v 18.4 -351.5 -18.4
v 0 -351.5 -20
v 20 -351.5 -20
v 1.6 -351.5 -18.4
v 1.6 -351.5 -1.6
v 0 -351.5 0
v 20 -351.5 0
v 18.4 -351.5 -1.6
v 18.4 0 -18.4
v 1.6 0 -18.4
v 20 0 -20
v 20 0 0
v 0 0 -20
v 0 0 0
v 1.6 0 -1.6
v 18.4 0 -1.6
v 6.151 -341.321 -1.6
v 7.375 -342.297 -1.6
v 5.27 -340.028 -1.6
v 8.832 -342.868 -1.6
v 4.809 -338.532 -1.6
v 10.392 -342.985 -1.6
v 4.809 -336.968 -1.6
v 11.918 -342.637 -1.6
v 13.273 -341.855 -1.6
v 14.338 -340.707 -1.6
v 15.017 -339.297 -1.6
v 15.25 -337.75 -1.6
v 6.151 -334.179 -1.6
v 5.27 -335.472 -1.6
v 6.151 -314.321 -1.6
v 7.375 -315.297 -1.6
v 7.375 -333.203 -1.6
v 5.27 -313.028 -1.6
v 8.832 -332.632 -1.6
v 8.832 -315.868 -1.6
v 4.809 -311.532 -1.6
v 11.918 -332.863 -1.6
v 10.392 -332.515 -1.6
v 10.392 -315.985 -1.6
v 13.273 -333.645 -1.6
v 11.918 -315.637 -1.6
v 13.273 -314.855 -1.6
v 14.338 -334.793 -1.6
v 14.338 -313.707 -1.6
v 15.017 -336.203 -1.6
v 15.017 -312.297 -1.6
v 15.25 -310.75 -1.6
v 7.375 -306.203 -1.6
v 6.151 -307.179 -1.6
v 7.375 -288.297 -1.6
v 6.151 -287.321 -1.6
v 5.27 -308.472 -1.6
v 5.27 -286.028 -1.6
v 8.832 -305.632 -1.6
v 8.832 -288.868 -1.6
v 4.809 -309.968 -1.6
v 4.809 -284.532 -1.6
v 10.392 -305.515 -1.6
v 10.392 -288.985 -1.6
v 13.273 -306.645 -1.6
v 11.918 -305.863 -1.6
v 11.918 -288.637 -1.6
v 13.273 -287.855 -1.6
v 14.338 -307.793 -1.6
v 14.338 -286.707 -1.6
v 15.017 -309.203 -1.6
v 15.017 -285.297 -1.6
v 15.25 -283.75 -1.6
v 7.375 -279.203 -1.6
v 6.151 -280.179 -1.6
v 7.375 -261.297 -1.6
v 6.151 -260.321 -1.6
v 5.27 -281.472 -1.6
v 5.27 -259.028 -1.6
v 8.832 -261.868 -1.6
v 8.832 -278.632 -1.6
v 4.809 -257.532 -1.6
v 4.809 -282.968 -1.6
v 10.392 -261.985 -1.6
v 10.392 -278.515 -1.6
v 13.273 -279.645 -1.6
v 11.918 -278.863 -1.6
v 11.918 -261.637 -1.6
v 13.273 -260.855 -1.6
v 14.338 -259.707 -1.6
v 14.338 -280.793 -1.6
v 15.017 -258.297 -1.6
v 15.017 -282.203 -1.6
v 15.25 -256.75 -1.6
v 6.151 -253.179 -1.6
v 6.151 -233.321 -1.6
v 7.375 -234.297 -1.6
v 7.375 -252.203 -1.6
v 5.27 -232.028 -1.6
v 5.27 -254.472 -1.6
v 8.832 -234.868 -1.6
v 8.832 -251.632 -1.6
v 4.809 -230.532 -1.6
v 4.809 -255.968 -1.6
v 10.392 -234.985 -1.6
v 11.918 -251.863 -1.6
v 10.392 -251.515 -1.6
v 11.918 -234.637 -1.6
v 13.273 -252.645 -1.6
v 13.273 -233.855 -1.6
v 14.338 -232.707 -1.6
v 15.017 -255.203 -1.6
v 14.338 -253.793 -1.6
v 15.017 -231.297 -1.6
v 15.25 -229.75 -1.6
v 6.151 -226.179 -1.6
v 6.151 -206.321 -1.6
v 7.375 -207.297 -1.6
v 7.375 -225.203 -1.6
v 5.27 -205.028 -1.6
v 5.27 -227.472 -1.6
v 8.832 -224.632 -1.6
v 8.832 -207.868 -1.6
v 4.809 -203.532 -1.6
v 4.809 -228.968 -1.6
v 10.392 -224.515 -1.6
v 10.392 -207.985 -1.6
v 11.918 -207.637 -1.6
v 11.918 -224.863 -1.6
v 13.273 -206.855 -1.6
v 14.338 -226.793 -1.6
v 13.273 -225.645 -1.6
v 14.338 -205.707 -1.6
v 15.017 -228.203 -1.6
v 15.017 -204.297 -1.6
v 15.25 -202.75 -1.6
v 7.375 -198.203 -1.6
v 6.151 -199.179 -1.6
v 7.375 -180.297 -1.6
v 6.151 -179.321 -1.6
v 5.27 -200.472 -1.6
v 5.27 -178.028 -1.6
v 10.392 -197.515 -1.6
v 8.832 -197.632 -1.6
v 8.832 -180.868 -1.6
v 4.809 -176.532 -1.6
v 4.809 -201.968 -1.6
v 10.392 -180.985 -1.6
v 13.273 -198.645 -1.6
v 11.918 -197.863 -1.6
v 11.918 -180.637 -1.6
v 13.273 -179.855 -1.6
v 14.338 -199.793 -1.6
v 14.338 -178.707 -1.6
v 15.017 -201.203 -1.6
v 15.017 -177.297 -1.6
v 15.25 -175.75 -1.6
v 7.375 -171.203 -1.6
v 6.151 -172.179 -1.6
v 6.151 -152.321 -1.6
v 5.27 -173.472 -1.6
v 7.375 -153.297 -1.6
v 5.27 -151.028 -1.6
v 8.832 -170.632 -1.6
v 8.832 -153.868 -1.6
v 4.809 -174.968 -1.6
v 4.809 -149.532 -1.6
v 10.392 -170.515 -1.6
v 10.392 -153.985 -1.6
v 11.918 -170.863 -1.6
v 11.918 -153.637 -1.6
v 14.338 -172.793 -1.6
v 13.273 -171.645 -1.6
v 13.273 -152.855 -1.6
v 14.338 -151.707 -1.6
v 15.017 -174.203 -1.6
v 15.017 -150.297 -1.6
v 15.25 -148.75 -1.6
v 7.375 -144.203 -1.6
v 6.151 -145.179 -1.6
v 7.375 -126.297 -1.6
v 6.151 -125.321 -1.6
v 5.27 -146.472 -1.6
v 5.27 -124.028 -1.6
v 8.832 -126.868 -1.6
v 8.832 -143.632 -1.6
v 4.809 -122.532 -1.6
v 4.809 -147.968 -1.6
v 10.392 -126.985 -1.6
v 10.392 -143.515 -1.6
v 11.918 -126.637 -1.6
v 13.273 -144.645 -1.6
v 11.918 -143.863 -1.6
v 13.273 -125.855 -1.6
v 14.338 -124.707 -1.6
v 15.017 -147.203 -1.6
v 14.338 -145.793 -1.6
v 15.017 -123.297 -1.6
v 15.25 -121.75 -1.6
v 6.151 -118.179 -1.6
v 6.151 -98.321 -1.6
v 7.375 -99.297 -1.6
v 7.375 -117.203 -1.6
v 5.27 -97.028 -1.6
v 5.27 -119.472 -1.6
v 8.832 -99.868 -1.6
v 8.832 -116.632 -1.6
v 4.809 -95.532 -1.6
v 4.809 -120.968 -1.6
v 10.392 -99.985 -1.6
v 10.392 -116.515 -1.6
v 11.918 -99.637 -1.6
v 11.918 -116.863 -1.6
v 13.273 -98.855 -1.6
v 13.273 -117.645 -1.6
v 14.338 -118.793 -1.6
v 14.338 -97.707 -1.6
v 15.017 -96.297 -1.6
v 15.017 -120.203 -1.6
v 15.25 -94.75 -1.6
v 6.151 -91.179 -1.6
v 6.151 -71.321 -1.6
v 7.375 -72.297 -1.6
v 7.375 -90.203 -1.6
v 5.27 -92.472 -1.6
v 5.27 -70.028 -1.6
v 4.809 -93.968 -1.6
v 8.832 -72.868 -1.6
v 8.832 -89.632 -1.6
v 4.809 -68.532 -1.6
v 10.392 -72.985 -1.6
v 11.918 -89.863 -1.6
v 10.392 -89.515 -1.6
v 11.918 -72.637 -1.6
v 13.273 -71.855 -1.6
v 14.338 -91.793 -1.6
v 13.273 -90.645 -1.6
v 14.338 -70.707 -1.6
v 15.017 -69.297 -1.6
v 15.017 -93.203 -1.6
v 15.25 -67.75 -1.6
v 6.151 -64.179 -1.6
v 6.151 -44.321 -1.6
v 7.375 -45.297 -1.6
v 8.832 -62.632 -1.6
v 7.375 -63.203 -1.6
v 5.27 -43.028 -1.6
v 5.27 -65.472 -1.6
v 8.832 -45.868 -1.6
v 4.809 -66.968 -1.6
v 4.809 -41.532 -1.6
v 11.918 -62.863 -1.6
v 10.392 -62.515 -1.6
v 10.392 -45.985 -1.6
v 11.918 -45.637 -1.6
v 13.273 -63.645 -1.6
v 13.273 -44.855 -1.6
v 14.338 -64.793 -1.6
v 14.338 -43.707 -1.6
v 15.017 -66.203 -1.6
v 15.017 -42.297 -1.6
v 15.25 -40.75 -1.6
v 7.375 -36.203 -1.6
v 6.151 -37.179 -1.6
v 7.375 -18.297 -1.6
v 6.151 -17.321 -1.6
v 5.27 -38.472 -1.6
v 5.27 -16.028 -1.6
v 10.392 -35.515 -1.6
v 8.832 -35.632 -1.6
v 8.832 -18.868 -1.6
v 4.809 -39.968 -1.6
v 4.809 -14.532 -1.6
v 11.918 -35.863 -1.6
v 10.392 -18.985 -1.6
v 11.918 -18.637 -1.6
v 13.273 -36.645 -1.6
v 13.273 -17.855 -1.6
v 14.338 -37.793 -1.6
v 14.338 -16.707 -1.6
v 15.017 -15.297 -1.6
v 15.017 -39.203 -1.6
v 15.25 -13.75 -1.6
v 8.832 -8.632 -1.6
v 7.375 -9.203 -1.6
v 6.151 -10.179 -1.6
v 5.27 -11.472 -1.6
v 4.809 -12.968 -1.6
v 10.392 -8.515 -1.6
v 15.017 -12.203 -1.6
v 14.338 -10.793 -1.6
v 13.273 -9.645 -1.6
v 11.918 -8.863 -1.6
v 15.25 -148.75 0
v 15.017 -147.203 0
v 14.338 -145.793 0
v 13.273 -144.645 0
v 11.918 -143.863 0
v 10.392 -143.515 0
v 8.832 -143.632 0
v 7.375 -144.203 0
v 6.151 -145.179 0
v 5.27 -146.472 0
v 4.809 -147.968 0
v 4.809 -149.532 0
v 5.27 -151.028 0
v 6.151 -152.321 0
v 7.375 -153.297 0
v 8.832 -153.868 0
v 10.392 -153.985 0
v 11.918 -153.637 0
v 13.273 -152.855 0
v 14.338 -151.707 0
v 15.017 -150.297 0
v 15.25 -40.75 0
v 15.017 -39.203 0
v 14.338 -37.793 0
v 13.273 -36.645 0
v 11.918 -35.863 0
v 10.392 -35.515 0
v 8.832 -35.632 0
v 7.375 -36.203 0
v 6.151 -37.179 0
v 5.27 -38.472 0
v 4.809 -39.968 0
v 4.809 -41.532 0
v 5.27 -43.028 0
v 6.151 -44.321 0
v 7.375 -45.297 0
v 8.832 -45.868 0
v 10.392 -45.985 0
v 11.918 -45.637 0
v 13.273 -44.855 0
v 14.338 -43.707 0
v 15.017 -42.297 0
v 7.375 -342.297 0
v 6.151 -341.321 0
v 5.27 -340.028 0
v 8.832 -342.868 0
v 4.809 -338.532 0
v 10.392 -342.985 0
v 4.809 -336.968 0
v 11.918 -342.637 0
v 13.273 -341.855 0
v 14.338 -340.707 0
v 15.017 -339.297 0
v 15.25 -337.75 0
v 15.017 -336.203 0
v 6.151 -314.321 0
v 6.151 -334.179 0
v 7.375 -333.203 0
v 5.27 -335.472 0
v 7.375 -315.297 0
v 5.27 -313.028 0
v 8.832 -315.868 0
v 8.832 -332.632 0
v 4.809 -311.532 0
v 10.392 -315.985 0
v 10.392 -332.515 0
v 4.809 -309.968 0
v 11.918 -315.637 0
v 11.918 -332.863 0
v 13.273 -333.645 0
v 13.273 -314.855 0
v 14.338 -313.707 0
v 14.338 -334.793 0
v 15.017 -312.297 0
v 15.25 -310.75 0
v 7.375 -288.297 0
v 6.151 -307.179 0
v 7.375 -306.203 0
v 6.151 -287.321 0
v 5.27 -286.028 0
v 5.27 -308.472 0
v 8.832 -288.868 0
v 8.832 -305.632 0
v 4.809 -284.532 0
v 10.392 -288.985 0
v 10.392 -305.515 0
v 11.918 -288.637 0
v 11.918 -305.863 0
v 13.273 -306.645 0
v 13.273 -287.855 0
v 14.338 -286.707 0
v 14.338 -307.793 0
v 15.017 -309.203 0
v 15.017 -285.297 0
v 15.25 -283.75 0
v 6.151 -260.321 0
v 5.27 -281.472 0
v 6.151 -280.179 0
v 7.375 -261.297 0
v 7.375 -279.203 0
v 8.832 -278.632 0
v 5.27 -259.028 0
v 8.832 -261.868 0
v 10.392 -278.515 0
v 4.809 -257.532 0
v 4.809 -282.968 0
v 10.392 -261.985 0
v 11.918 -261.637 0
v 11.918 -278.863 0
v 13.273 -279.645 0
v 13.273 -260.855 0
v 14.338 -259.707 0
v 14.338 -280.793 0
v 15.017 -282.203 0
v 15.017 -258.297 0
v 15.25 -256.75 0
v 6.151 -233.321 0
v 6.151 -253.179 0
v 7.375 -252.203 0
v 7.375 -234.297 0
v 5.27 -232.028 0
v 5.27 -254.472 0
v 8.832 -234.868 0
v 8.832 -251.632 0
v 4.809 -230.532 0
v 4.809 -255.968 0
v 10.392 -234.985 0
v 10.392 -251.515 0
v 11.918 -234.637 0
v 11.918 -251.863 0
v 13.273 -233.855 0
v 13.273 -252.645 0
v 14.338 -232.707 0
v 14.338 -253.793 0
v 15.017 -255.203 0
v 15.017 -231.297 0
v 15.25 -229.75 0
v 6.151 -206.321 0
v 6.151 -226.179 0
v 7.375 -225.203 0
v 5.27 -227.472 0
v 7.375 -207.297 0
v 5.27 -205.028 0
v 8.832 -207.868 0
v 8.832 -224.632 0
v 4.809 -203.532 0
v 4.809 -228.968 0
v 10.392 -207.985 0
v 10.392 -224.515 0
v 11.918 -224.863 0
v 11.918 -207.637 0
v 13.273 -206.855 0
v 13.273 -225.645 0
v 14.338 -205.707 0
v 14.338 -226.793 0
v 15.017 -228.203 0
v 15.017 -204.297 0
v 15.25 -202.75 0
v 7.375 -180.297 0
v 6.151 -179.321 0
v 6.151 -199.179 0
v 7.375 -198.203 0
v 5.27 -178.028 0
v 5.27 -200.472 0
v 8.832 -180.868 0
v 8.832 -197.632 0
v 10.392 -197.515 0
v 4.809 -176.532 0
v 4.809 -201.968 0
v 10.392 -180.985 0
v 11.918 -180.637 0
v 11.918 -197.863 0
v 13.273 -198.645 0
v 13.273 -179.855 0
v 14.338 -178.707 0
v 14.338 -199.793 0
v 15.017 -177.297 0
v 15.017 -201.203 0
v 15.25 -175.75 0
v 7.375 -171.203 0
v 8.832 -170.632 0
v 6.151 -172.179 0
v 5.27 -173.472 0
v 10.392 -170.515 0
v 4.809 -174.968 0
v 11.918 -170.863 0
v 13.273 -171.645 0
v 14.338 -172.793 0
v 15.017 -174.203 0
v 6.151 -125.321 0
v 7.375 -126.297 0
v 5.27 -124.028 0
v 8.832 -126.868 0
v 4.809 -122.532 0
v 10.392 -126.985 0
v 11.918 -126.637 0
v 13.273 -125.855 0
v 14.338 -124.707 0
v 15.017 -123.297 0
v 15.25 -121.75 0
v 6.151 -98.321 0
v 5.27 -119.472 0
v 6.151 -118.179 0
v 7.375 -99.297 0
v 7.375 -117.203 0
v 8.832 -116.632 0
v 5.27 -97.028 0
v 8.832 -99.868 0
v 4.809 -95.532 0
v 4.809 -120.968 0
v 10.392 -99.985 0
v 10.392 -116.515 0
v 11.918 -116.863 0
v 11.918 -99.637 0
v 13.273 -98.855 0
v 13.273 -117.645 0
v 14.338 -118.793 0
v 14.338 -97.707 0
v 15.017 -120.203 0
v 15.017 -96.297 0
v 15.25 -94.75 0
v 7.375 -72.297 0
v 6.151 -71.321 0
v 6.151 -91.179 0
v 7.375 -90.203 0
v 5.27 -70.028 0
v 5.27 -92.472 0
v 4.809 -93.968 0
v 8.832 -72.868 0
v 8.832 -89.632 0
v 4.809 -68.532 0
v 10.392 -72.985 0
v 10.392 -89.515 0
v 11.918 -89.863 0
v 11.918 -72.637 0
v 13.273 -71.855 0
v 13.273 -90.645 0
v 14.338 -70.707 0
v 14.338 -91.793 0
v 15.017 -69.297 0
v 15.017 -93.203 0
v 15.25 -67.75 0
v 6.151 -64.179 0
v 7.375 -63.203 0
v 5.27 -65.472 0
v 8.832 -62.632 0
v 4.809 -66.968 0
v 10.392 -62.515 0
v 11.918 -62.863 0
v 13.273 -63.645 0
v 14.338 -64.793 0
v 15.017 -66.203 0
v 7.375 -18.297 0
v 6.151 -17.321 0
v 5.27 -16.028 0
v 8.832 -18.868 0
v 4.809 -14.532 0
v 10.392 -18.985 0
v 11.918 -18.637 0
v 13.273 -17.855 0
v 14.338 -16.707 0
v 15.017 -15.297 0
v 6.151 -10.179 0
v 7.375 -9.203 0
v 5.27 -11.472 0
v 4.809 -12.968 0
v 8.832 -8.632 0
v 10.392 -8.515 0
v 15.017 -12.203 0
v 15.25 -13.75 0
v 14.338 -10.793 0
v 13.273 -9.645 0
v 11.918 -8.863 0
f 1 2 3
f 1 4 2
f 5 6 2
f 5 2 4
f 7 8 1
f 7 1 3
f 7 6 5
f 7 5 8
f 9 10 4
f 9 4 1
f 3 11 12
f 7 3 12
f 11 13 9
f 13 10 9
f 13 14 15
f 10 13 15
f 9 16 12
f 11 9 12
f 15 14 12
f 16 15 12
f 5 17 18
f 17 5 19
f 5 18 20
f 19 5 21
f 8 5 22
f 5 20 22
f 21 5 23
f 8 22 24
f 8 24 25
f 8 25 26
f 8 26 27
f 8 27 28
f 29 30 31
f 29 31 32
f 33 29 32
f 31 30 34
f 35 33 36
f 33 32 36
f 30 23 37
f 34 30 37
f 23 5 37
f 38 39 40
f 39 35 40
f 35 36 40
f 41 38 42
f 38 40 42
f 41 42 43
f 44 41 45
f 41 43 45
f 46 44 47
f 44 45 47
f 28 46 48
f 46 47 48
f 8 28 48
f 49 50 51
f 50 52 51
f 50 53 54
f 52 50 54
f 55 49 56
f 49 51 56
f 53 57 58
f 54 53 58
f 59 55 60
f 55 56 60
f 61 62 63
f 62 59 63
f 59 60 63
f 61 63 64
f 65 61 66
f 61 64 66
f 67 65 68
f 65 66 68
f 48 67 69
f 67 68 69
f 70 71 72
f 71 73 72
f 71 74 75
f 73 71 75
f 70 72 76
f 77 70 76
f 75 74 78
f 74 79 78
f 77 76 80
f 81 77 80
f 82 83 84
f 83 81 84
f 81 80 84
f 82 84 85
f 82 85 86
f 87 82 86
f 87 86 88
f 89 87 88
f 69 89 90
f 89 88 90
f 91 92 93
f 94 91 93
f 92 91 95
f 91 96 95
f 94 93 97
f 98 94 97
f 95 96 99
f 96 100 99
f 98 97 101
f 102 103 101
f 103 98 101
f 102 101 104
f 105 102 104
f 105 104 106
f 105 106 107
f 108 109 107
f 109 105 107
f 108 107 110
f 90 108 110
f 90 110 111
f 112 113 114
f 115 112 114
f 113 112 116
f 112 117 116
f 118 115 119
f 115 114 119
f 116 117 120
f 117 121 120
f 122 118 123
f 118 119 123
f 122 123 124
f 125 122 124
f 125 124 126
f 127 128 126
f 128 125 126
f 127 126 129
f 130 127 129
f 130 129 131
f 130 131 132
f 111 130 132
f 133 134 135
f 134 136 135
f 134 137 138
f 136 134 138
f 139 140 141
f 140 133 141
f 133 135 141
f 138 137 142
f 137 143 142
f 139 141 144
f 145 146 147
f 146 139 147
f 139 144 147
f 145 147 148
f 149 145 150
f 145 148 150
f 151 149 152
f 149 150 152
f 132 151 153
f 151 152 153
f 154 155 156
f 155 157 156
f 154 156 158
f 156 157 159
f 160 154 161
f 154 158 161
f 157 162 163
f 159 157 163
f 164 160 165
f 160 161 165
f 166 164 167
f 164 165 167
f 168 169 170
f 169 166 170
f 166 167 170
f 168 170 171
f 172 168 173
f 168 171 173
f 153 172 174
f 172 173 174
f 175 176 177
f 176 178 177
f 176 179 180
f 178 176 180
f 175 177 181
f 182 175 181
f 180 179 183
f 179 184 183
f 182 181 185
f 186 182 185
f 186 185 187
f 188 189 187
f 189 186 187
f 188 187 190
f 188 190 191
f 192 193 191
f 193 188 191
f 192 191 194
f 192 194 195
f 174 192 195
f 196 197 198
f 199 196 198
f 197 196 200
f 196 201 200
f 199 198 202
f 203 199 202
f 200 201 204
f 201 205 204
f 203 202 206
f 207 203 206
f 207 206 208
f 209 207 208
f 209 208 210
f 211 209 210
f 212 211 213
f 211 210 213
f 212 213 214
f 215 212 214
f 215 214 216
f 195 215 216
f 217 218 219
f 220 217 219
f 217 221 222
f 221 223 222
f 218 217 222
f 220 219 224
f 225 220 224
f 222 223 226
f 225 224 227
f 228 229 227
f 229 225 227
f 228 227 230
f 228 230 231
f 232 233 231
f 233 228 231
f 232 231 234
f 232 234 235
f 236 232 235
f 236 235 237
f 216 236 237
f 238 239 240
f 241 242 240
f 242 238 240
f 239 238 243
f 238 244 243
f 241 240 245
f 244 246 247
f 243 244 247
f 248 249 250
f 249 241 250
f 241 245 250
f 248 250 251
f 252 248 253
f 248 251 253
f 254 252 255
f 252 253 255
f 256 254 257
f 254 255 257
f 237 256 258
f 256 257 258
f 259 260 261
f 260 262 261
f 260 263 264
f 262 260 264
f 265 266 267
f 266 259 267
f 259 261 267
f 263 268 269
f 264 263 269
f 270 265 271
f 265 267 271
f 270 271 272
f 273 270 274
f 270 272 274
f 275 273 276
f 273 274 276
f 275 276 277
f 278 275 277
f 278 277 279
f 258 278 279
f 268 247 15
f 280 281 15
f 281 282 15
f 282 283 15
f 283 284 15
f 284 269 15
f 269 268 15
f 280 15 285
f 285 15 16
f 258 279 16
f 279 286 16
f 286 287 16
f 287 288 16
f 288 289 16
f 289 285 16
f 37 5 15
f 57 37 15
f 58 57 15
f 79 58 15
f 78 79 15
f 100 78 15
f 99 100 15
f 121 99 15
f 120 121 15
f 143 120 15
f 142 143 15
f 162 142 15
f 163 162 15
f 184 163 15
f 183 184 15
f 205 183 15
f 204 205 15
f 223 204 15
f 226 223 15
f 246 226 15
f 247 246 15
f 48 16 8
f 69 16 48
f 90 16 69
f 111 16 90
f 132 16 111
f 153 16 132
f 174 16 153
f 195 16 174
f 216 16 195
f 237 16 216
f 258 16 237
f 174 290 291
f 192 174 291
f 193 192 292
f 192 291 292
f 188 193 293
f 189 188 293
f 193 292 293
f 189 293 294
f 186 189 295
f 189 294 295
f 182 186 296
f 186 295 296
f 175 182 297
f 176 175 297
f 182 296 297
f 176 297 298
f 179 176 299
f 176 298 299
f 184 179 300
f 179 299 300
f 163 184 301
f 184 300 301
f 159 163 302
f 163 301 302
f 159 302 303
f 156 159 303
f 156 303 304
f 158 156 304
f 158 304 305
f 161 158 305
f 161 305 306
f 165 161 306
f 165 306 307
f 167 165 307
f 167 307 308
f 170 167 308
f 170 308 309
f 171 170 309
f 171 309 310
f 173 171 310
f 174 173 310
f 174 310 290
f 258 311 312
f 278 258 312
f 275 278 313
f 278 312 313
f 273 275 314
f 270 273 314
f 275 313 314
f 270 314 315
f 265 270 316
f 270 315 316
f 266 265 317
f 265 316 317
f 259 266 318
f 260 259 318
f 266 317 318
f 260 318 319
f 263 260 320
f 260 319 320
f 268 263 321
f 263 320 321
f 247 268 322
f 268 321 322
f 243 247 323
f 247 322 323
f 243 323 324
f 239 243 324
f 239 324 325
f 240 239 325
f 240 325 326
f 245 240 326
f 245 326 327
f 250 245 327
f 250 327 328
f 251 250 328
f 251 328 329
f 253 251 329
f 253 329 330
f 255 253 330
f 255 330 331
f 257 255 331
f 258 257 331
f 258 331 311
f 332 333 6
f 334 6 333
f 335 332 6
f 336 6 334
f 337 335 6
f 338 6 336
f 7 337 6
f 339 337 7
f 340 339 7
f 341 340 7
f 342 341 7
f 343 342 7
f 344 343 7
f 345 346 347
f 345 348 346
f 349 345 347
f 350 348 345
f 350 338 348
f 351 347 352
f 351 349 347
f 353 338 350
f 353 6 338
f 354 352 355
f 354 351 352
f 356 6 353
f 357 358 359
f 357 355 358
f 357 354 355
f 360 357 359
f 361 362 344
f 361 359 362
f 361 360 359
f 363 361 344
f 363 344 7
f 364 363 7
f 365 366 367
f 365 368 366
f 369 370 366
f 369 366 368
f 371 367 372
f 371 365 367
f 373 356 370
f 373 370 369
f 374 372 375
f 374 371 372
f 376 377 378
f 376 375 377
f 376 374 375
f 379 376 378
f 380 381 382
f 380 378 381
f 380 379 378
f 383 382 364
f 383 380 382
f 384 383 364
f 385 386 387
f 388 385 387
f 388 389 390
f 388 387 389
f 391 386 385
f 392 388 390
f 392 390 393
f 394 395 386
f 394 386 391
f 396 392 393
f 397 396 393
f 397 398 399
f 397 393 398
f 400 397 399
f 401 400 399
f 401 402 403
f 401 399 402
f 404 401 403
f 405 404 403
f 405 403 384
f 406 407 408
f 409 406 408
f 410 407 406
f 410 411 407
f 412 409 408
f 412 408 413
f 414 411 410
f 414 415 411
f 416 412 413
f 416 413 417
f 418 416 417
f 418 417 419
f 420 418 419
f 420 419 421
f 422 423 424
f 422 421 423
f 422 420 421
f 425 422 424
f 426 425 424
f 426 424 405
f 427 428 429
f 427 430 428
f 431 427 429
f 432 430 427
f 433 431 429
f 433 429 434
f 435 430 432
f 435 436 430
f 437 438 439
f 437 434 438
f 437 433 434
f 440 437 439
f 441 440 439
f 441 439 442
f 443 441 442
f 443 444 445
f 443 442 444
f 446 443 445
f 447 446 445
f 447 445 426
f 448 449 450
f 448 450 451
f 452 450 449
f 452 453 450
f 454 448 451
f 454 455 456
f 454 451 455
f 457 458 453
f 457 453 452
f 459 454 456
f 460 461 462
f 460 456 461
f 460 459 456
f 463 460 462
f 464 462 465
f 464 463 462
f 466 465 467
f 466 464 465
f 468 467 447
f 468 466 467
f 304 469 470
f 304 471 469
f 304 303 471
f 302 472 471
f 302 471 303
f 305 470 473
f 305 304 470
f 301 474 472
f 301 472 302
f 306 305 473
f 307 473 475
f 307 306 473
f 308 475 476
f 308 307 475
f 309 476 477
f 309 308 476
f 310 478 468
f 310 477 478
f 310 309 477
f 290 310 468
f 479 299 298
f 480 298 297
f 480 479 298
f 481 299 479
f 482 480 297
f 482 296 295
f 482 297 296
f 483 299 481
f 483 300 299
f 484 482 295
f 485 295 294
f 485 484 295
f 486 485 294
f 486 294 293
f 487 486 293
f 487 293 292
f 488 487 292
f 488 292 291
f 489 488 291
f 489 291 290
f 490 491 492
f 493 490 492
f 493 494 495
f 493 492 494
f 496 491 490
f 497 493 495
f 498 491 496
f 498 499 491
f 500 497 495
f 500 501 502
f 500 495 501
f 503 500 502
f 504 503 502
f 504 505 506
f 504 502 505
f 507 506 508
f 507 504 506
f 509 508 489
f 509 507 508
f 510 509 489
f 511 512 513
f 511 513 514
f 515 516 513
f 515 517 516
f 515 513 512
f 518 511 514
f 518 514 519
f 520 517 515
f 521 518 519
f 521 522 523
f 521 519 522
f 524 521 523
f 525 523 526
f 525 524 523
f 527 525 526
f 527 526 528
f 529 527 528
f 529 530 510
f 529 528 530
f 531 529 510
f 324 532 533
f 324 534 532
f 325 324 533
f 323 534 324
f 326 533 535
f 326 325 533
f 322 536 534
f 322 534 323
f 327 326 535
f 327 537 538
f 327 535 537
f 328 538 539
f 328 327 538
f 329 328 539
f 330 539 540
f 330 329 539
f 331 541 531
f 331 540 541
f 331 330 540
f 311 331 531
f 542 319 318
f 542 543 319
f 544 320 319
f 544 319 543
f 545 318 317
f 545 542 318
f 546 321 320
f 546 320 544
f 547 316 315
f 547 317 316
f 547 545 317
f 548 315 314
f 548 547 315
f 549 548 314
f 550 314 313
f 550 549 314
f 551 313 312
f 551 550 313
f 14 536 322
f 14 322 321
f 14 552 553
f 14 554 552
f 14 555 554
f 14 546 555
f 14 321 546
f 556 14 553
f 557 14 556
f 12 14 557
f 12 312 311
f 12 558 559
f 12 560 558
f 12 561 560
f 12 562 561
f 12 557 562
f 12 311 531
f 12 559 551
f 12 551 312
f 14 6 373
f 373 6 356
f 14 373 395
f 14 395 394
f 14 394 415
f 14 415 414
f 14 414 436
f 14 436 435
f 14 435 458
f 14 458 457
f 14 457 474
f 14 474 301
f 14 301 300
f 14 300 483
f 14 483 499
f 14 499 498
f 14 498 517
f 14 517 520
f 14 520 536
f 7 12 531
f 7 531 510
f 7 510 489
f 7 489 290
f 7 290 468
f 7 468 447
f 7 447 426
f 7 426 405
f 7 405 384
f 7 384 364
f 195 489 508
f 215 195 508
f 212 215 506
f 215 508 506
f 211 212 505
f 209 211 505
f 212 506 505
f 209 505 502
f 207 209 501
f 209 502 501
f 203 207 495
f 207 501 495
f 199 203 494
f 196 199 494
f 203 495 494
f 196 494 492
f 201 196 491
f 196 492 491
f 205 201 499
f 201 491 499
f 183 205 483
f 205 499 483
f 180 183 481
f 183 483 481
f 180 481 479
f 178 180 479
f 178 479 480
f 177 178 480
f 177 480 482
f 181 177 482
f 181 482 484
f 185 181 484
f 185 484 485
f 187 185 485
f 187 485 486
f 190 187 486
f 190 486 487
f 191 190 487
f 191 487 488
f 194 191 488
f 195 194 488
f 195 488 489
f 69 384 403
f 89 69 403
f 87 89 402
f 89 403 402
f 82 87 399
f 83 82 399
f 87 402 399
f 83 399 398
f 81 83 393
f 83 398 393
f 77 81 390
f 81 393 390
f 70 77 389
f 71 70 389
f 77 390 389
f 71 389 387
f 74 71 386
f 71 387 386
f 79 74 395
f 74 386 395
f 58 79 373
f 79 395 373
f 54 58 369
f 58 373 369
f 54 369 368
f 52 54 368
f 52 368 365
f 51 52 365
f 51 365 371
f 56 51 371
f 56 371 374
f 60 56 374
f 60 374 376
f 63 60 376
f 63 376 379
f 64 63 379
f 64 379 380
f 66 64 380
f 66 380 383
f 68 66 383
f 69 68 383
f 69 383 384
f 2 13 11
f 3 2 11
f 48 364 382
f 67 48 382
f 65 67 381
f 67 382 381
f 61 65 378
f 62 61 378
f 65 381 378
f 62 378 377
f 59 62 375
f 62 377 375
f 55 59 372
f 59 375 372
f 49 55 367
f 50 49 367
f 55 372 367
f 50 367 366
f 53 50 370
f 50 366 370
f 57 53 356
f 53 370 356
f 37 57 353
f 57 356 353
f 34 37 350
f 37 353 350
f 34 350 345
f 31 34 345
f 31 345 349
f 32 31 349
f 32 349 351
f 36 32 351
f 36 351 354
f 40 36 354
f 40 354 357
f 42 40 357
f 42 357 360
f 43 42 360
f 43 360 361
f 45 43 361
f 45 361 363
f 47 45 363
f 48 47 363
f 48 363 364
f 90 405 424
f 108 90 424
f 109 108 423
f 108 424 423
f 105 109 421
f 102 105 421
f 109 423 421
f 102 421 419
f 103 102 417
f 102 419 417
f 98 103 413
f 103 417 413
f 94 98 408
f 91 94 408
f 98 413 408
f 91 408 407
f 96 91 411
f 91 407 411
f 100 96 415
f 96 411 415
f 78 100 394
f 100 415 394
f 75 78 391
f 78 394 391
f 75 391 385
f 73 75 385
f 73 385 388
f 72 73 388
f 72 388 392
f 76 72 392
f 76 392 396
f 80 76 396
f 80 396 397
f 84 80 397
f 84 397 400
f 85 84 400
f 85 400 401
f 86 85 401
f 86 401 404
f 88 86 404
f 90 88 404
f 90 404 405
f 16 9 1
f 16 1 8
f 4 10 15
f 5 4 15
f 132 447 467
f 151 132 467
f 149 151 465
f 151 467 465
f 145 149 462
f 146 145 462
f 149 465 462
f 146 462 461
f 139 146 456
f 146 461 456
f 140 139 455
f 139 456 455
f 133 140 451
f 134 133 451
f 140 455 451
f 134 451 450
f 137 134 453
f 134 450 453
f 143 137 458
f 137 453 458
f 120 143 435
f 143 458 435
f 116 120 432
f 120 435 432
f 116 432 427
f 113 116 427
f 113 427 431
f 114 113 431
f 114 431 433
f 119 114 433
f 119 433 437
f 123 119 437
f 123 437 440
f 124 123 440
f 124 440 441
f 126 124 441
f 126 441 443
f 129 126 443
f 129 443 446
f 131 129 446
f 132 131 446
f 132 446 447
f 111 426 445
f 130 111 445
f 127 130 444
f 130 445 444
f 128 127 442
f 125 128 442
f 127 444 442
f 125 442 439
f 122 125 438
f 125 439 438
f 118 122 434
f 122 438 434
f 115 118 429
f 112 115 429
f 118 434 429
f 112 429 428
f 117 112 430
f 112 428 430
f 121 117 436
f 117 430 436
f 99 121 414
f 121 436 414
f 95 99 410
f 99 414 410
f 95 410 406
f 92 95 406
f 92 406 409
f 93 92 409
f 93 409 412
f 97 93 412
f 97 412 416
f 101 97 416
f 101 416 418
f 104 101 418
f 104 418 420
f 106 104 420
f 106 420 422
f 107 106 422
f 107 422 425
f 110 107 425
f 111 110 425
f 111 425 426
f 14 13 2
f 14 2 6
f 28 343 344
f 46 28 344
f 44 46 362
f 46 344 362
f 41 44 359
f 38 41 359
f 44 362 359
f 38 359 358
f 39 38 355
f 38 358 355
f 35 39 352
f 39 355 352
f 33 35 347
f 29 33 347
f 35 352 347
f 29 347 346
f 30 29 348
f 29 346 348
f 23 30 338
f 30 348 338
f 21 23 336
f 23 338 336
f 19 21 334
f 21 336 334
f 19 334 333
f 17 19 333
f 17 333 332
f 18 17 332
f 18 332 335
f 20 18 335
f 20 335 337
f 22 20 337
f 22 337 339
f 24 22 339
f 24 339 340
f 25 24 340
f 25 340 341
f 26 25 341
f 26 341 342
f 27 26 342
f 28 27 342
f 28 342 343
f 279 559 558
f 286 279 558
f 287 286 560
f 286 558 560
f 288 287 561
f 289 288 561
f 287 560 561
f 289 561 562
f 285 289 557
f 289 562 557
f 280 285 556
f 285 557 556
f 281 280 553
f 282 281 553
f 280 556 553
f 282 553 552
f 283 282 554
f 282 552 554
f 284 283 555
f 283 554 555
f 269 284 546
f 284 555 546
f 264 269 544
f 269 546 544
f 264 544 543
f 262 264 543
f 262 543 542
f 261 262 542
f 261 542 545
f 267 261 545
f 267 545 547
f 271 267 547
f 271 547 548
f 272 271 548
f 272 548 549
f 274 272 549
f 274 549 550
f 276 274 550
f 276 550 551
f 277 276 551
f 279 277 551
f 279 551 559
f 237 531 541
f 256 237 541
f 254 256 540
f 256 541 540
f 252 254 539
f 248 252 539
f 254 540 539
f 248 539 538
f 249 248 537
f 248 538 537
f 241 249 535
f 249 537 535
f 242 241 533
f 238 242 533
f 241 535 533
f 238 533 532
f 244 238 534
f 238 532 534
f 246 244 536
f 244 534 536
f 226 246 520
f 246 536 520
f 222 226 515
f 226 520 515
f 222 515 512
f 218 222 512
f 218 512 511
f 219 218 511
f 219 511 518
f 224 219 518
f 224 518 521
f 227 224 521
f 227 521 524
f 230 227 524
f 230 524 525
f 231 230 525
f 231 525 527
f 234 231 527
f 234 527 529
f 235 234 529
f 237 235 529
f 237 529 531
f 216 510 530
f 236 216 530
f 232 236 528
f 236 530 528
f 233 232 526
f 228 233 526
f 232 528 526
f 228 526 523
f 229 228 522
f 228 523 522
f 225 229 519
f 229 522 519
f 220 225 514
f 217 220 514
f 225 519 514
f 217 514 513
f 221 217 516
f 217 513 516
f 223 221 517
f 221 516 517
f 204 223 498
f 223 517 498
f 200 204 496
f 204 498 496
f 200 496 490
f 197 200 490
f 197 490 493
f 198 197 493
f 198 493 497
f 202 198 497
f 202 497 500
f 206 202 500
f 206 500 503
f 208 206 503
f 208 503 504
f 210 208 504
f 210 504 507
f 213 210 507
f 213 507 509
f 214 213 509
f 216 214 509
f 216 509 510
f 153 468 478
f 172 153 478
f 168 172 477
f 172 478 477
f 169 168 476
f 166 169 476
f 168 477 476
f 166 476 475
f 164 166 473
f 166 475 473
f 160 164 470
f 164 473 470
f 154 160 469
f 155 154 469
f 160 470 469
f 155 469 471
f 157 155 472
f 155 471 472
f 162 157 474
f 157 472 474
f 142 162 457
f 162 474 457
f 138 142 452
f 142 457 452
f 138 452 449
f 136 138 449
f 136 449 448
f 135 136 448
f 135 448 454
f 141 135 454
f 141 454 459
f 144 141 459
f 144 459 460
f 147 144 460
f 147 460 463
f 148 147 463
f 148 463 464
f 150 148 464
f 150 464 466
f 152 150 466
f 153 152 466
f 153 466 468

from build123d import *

# Parameters (mm, degrees)
F0_W     = 20
F0_H     = 20
F0_W_2   = 16.8
F0_H_2   = 16.8
F1_DEPTH = 351.5
F2_R     = 5.25
F3_DEPTH = 5


# Not quite as in the source:
# - a feature names something its author has since deleted; it is built from what else it names


with BuildPart() as f1:
    # F0 (on Front) → F1 (new body)
    with BuildSketch(Plane.XZ):
        with Locations((10, -10)):
            Rectangle(F0_W, F0_H)
        with Locations((10, -10)):
            Rectangle(F0_W_2, F0_H_2, mode=Mode.SUBTRACT)
    extrude(amount=F1_DEPTH)

    # F2 (on face) → F3 (cut)
    with BuildSketch(Plane.XY):
        with Locations((10, -310.75)):
            Circle(F2_R)
        with Locations((10, -283.75)):
            Circle(F2_R)
        with Locations((10, -256.75)):
            Circle(F2_R)
        with Locations((10, -229.75)):
            Circle(F2_R)
        with Locations((10, -202.75)):
            Circle(F2_R)
        with Locations((10, -175.75)):
            Circle(F2_R)
        with Locations((10, -148.75)):
            Circle(F2_R)
        with Locations((10, -121.75)):
            Circle(F2_R)
        with Locations((10, -94.75)):
            Circle(F2_R)
        with Locations((10, -67.75)):
            Circle(F2_R)
        with Locations((10, -40.75)):
            Circle(F2_R)
        with Locations((10, -13.75)):
            Circle(F2_R)
        with Locations((10, -337.75)):
            Circle(F2_R)
    extrude(amount=-F3_DEPTH, mode=Mode.SUBTRACT)


solid = f1.part
